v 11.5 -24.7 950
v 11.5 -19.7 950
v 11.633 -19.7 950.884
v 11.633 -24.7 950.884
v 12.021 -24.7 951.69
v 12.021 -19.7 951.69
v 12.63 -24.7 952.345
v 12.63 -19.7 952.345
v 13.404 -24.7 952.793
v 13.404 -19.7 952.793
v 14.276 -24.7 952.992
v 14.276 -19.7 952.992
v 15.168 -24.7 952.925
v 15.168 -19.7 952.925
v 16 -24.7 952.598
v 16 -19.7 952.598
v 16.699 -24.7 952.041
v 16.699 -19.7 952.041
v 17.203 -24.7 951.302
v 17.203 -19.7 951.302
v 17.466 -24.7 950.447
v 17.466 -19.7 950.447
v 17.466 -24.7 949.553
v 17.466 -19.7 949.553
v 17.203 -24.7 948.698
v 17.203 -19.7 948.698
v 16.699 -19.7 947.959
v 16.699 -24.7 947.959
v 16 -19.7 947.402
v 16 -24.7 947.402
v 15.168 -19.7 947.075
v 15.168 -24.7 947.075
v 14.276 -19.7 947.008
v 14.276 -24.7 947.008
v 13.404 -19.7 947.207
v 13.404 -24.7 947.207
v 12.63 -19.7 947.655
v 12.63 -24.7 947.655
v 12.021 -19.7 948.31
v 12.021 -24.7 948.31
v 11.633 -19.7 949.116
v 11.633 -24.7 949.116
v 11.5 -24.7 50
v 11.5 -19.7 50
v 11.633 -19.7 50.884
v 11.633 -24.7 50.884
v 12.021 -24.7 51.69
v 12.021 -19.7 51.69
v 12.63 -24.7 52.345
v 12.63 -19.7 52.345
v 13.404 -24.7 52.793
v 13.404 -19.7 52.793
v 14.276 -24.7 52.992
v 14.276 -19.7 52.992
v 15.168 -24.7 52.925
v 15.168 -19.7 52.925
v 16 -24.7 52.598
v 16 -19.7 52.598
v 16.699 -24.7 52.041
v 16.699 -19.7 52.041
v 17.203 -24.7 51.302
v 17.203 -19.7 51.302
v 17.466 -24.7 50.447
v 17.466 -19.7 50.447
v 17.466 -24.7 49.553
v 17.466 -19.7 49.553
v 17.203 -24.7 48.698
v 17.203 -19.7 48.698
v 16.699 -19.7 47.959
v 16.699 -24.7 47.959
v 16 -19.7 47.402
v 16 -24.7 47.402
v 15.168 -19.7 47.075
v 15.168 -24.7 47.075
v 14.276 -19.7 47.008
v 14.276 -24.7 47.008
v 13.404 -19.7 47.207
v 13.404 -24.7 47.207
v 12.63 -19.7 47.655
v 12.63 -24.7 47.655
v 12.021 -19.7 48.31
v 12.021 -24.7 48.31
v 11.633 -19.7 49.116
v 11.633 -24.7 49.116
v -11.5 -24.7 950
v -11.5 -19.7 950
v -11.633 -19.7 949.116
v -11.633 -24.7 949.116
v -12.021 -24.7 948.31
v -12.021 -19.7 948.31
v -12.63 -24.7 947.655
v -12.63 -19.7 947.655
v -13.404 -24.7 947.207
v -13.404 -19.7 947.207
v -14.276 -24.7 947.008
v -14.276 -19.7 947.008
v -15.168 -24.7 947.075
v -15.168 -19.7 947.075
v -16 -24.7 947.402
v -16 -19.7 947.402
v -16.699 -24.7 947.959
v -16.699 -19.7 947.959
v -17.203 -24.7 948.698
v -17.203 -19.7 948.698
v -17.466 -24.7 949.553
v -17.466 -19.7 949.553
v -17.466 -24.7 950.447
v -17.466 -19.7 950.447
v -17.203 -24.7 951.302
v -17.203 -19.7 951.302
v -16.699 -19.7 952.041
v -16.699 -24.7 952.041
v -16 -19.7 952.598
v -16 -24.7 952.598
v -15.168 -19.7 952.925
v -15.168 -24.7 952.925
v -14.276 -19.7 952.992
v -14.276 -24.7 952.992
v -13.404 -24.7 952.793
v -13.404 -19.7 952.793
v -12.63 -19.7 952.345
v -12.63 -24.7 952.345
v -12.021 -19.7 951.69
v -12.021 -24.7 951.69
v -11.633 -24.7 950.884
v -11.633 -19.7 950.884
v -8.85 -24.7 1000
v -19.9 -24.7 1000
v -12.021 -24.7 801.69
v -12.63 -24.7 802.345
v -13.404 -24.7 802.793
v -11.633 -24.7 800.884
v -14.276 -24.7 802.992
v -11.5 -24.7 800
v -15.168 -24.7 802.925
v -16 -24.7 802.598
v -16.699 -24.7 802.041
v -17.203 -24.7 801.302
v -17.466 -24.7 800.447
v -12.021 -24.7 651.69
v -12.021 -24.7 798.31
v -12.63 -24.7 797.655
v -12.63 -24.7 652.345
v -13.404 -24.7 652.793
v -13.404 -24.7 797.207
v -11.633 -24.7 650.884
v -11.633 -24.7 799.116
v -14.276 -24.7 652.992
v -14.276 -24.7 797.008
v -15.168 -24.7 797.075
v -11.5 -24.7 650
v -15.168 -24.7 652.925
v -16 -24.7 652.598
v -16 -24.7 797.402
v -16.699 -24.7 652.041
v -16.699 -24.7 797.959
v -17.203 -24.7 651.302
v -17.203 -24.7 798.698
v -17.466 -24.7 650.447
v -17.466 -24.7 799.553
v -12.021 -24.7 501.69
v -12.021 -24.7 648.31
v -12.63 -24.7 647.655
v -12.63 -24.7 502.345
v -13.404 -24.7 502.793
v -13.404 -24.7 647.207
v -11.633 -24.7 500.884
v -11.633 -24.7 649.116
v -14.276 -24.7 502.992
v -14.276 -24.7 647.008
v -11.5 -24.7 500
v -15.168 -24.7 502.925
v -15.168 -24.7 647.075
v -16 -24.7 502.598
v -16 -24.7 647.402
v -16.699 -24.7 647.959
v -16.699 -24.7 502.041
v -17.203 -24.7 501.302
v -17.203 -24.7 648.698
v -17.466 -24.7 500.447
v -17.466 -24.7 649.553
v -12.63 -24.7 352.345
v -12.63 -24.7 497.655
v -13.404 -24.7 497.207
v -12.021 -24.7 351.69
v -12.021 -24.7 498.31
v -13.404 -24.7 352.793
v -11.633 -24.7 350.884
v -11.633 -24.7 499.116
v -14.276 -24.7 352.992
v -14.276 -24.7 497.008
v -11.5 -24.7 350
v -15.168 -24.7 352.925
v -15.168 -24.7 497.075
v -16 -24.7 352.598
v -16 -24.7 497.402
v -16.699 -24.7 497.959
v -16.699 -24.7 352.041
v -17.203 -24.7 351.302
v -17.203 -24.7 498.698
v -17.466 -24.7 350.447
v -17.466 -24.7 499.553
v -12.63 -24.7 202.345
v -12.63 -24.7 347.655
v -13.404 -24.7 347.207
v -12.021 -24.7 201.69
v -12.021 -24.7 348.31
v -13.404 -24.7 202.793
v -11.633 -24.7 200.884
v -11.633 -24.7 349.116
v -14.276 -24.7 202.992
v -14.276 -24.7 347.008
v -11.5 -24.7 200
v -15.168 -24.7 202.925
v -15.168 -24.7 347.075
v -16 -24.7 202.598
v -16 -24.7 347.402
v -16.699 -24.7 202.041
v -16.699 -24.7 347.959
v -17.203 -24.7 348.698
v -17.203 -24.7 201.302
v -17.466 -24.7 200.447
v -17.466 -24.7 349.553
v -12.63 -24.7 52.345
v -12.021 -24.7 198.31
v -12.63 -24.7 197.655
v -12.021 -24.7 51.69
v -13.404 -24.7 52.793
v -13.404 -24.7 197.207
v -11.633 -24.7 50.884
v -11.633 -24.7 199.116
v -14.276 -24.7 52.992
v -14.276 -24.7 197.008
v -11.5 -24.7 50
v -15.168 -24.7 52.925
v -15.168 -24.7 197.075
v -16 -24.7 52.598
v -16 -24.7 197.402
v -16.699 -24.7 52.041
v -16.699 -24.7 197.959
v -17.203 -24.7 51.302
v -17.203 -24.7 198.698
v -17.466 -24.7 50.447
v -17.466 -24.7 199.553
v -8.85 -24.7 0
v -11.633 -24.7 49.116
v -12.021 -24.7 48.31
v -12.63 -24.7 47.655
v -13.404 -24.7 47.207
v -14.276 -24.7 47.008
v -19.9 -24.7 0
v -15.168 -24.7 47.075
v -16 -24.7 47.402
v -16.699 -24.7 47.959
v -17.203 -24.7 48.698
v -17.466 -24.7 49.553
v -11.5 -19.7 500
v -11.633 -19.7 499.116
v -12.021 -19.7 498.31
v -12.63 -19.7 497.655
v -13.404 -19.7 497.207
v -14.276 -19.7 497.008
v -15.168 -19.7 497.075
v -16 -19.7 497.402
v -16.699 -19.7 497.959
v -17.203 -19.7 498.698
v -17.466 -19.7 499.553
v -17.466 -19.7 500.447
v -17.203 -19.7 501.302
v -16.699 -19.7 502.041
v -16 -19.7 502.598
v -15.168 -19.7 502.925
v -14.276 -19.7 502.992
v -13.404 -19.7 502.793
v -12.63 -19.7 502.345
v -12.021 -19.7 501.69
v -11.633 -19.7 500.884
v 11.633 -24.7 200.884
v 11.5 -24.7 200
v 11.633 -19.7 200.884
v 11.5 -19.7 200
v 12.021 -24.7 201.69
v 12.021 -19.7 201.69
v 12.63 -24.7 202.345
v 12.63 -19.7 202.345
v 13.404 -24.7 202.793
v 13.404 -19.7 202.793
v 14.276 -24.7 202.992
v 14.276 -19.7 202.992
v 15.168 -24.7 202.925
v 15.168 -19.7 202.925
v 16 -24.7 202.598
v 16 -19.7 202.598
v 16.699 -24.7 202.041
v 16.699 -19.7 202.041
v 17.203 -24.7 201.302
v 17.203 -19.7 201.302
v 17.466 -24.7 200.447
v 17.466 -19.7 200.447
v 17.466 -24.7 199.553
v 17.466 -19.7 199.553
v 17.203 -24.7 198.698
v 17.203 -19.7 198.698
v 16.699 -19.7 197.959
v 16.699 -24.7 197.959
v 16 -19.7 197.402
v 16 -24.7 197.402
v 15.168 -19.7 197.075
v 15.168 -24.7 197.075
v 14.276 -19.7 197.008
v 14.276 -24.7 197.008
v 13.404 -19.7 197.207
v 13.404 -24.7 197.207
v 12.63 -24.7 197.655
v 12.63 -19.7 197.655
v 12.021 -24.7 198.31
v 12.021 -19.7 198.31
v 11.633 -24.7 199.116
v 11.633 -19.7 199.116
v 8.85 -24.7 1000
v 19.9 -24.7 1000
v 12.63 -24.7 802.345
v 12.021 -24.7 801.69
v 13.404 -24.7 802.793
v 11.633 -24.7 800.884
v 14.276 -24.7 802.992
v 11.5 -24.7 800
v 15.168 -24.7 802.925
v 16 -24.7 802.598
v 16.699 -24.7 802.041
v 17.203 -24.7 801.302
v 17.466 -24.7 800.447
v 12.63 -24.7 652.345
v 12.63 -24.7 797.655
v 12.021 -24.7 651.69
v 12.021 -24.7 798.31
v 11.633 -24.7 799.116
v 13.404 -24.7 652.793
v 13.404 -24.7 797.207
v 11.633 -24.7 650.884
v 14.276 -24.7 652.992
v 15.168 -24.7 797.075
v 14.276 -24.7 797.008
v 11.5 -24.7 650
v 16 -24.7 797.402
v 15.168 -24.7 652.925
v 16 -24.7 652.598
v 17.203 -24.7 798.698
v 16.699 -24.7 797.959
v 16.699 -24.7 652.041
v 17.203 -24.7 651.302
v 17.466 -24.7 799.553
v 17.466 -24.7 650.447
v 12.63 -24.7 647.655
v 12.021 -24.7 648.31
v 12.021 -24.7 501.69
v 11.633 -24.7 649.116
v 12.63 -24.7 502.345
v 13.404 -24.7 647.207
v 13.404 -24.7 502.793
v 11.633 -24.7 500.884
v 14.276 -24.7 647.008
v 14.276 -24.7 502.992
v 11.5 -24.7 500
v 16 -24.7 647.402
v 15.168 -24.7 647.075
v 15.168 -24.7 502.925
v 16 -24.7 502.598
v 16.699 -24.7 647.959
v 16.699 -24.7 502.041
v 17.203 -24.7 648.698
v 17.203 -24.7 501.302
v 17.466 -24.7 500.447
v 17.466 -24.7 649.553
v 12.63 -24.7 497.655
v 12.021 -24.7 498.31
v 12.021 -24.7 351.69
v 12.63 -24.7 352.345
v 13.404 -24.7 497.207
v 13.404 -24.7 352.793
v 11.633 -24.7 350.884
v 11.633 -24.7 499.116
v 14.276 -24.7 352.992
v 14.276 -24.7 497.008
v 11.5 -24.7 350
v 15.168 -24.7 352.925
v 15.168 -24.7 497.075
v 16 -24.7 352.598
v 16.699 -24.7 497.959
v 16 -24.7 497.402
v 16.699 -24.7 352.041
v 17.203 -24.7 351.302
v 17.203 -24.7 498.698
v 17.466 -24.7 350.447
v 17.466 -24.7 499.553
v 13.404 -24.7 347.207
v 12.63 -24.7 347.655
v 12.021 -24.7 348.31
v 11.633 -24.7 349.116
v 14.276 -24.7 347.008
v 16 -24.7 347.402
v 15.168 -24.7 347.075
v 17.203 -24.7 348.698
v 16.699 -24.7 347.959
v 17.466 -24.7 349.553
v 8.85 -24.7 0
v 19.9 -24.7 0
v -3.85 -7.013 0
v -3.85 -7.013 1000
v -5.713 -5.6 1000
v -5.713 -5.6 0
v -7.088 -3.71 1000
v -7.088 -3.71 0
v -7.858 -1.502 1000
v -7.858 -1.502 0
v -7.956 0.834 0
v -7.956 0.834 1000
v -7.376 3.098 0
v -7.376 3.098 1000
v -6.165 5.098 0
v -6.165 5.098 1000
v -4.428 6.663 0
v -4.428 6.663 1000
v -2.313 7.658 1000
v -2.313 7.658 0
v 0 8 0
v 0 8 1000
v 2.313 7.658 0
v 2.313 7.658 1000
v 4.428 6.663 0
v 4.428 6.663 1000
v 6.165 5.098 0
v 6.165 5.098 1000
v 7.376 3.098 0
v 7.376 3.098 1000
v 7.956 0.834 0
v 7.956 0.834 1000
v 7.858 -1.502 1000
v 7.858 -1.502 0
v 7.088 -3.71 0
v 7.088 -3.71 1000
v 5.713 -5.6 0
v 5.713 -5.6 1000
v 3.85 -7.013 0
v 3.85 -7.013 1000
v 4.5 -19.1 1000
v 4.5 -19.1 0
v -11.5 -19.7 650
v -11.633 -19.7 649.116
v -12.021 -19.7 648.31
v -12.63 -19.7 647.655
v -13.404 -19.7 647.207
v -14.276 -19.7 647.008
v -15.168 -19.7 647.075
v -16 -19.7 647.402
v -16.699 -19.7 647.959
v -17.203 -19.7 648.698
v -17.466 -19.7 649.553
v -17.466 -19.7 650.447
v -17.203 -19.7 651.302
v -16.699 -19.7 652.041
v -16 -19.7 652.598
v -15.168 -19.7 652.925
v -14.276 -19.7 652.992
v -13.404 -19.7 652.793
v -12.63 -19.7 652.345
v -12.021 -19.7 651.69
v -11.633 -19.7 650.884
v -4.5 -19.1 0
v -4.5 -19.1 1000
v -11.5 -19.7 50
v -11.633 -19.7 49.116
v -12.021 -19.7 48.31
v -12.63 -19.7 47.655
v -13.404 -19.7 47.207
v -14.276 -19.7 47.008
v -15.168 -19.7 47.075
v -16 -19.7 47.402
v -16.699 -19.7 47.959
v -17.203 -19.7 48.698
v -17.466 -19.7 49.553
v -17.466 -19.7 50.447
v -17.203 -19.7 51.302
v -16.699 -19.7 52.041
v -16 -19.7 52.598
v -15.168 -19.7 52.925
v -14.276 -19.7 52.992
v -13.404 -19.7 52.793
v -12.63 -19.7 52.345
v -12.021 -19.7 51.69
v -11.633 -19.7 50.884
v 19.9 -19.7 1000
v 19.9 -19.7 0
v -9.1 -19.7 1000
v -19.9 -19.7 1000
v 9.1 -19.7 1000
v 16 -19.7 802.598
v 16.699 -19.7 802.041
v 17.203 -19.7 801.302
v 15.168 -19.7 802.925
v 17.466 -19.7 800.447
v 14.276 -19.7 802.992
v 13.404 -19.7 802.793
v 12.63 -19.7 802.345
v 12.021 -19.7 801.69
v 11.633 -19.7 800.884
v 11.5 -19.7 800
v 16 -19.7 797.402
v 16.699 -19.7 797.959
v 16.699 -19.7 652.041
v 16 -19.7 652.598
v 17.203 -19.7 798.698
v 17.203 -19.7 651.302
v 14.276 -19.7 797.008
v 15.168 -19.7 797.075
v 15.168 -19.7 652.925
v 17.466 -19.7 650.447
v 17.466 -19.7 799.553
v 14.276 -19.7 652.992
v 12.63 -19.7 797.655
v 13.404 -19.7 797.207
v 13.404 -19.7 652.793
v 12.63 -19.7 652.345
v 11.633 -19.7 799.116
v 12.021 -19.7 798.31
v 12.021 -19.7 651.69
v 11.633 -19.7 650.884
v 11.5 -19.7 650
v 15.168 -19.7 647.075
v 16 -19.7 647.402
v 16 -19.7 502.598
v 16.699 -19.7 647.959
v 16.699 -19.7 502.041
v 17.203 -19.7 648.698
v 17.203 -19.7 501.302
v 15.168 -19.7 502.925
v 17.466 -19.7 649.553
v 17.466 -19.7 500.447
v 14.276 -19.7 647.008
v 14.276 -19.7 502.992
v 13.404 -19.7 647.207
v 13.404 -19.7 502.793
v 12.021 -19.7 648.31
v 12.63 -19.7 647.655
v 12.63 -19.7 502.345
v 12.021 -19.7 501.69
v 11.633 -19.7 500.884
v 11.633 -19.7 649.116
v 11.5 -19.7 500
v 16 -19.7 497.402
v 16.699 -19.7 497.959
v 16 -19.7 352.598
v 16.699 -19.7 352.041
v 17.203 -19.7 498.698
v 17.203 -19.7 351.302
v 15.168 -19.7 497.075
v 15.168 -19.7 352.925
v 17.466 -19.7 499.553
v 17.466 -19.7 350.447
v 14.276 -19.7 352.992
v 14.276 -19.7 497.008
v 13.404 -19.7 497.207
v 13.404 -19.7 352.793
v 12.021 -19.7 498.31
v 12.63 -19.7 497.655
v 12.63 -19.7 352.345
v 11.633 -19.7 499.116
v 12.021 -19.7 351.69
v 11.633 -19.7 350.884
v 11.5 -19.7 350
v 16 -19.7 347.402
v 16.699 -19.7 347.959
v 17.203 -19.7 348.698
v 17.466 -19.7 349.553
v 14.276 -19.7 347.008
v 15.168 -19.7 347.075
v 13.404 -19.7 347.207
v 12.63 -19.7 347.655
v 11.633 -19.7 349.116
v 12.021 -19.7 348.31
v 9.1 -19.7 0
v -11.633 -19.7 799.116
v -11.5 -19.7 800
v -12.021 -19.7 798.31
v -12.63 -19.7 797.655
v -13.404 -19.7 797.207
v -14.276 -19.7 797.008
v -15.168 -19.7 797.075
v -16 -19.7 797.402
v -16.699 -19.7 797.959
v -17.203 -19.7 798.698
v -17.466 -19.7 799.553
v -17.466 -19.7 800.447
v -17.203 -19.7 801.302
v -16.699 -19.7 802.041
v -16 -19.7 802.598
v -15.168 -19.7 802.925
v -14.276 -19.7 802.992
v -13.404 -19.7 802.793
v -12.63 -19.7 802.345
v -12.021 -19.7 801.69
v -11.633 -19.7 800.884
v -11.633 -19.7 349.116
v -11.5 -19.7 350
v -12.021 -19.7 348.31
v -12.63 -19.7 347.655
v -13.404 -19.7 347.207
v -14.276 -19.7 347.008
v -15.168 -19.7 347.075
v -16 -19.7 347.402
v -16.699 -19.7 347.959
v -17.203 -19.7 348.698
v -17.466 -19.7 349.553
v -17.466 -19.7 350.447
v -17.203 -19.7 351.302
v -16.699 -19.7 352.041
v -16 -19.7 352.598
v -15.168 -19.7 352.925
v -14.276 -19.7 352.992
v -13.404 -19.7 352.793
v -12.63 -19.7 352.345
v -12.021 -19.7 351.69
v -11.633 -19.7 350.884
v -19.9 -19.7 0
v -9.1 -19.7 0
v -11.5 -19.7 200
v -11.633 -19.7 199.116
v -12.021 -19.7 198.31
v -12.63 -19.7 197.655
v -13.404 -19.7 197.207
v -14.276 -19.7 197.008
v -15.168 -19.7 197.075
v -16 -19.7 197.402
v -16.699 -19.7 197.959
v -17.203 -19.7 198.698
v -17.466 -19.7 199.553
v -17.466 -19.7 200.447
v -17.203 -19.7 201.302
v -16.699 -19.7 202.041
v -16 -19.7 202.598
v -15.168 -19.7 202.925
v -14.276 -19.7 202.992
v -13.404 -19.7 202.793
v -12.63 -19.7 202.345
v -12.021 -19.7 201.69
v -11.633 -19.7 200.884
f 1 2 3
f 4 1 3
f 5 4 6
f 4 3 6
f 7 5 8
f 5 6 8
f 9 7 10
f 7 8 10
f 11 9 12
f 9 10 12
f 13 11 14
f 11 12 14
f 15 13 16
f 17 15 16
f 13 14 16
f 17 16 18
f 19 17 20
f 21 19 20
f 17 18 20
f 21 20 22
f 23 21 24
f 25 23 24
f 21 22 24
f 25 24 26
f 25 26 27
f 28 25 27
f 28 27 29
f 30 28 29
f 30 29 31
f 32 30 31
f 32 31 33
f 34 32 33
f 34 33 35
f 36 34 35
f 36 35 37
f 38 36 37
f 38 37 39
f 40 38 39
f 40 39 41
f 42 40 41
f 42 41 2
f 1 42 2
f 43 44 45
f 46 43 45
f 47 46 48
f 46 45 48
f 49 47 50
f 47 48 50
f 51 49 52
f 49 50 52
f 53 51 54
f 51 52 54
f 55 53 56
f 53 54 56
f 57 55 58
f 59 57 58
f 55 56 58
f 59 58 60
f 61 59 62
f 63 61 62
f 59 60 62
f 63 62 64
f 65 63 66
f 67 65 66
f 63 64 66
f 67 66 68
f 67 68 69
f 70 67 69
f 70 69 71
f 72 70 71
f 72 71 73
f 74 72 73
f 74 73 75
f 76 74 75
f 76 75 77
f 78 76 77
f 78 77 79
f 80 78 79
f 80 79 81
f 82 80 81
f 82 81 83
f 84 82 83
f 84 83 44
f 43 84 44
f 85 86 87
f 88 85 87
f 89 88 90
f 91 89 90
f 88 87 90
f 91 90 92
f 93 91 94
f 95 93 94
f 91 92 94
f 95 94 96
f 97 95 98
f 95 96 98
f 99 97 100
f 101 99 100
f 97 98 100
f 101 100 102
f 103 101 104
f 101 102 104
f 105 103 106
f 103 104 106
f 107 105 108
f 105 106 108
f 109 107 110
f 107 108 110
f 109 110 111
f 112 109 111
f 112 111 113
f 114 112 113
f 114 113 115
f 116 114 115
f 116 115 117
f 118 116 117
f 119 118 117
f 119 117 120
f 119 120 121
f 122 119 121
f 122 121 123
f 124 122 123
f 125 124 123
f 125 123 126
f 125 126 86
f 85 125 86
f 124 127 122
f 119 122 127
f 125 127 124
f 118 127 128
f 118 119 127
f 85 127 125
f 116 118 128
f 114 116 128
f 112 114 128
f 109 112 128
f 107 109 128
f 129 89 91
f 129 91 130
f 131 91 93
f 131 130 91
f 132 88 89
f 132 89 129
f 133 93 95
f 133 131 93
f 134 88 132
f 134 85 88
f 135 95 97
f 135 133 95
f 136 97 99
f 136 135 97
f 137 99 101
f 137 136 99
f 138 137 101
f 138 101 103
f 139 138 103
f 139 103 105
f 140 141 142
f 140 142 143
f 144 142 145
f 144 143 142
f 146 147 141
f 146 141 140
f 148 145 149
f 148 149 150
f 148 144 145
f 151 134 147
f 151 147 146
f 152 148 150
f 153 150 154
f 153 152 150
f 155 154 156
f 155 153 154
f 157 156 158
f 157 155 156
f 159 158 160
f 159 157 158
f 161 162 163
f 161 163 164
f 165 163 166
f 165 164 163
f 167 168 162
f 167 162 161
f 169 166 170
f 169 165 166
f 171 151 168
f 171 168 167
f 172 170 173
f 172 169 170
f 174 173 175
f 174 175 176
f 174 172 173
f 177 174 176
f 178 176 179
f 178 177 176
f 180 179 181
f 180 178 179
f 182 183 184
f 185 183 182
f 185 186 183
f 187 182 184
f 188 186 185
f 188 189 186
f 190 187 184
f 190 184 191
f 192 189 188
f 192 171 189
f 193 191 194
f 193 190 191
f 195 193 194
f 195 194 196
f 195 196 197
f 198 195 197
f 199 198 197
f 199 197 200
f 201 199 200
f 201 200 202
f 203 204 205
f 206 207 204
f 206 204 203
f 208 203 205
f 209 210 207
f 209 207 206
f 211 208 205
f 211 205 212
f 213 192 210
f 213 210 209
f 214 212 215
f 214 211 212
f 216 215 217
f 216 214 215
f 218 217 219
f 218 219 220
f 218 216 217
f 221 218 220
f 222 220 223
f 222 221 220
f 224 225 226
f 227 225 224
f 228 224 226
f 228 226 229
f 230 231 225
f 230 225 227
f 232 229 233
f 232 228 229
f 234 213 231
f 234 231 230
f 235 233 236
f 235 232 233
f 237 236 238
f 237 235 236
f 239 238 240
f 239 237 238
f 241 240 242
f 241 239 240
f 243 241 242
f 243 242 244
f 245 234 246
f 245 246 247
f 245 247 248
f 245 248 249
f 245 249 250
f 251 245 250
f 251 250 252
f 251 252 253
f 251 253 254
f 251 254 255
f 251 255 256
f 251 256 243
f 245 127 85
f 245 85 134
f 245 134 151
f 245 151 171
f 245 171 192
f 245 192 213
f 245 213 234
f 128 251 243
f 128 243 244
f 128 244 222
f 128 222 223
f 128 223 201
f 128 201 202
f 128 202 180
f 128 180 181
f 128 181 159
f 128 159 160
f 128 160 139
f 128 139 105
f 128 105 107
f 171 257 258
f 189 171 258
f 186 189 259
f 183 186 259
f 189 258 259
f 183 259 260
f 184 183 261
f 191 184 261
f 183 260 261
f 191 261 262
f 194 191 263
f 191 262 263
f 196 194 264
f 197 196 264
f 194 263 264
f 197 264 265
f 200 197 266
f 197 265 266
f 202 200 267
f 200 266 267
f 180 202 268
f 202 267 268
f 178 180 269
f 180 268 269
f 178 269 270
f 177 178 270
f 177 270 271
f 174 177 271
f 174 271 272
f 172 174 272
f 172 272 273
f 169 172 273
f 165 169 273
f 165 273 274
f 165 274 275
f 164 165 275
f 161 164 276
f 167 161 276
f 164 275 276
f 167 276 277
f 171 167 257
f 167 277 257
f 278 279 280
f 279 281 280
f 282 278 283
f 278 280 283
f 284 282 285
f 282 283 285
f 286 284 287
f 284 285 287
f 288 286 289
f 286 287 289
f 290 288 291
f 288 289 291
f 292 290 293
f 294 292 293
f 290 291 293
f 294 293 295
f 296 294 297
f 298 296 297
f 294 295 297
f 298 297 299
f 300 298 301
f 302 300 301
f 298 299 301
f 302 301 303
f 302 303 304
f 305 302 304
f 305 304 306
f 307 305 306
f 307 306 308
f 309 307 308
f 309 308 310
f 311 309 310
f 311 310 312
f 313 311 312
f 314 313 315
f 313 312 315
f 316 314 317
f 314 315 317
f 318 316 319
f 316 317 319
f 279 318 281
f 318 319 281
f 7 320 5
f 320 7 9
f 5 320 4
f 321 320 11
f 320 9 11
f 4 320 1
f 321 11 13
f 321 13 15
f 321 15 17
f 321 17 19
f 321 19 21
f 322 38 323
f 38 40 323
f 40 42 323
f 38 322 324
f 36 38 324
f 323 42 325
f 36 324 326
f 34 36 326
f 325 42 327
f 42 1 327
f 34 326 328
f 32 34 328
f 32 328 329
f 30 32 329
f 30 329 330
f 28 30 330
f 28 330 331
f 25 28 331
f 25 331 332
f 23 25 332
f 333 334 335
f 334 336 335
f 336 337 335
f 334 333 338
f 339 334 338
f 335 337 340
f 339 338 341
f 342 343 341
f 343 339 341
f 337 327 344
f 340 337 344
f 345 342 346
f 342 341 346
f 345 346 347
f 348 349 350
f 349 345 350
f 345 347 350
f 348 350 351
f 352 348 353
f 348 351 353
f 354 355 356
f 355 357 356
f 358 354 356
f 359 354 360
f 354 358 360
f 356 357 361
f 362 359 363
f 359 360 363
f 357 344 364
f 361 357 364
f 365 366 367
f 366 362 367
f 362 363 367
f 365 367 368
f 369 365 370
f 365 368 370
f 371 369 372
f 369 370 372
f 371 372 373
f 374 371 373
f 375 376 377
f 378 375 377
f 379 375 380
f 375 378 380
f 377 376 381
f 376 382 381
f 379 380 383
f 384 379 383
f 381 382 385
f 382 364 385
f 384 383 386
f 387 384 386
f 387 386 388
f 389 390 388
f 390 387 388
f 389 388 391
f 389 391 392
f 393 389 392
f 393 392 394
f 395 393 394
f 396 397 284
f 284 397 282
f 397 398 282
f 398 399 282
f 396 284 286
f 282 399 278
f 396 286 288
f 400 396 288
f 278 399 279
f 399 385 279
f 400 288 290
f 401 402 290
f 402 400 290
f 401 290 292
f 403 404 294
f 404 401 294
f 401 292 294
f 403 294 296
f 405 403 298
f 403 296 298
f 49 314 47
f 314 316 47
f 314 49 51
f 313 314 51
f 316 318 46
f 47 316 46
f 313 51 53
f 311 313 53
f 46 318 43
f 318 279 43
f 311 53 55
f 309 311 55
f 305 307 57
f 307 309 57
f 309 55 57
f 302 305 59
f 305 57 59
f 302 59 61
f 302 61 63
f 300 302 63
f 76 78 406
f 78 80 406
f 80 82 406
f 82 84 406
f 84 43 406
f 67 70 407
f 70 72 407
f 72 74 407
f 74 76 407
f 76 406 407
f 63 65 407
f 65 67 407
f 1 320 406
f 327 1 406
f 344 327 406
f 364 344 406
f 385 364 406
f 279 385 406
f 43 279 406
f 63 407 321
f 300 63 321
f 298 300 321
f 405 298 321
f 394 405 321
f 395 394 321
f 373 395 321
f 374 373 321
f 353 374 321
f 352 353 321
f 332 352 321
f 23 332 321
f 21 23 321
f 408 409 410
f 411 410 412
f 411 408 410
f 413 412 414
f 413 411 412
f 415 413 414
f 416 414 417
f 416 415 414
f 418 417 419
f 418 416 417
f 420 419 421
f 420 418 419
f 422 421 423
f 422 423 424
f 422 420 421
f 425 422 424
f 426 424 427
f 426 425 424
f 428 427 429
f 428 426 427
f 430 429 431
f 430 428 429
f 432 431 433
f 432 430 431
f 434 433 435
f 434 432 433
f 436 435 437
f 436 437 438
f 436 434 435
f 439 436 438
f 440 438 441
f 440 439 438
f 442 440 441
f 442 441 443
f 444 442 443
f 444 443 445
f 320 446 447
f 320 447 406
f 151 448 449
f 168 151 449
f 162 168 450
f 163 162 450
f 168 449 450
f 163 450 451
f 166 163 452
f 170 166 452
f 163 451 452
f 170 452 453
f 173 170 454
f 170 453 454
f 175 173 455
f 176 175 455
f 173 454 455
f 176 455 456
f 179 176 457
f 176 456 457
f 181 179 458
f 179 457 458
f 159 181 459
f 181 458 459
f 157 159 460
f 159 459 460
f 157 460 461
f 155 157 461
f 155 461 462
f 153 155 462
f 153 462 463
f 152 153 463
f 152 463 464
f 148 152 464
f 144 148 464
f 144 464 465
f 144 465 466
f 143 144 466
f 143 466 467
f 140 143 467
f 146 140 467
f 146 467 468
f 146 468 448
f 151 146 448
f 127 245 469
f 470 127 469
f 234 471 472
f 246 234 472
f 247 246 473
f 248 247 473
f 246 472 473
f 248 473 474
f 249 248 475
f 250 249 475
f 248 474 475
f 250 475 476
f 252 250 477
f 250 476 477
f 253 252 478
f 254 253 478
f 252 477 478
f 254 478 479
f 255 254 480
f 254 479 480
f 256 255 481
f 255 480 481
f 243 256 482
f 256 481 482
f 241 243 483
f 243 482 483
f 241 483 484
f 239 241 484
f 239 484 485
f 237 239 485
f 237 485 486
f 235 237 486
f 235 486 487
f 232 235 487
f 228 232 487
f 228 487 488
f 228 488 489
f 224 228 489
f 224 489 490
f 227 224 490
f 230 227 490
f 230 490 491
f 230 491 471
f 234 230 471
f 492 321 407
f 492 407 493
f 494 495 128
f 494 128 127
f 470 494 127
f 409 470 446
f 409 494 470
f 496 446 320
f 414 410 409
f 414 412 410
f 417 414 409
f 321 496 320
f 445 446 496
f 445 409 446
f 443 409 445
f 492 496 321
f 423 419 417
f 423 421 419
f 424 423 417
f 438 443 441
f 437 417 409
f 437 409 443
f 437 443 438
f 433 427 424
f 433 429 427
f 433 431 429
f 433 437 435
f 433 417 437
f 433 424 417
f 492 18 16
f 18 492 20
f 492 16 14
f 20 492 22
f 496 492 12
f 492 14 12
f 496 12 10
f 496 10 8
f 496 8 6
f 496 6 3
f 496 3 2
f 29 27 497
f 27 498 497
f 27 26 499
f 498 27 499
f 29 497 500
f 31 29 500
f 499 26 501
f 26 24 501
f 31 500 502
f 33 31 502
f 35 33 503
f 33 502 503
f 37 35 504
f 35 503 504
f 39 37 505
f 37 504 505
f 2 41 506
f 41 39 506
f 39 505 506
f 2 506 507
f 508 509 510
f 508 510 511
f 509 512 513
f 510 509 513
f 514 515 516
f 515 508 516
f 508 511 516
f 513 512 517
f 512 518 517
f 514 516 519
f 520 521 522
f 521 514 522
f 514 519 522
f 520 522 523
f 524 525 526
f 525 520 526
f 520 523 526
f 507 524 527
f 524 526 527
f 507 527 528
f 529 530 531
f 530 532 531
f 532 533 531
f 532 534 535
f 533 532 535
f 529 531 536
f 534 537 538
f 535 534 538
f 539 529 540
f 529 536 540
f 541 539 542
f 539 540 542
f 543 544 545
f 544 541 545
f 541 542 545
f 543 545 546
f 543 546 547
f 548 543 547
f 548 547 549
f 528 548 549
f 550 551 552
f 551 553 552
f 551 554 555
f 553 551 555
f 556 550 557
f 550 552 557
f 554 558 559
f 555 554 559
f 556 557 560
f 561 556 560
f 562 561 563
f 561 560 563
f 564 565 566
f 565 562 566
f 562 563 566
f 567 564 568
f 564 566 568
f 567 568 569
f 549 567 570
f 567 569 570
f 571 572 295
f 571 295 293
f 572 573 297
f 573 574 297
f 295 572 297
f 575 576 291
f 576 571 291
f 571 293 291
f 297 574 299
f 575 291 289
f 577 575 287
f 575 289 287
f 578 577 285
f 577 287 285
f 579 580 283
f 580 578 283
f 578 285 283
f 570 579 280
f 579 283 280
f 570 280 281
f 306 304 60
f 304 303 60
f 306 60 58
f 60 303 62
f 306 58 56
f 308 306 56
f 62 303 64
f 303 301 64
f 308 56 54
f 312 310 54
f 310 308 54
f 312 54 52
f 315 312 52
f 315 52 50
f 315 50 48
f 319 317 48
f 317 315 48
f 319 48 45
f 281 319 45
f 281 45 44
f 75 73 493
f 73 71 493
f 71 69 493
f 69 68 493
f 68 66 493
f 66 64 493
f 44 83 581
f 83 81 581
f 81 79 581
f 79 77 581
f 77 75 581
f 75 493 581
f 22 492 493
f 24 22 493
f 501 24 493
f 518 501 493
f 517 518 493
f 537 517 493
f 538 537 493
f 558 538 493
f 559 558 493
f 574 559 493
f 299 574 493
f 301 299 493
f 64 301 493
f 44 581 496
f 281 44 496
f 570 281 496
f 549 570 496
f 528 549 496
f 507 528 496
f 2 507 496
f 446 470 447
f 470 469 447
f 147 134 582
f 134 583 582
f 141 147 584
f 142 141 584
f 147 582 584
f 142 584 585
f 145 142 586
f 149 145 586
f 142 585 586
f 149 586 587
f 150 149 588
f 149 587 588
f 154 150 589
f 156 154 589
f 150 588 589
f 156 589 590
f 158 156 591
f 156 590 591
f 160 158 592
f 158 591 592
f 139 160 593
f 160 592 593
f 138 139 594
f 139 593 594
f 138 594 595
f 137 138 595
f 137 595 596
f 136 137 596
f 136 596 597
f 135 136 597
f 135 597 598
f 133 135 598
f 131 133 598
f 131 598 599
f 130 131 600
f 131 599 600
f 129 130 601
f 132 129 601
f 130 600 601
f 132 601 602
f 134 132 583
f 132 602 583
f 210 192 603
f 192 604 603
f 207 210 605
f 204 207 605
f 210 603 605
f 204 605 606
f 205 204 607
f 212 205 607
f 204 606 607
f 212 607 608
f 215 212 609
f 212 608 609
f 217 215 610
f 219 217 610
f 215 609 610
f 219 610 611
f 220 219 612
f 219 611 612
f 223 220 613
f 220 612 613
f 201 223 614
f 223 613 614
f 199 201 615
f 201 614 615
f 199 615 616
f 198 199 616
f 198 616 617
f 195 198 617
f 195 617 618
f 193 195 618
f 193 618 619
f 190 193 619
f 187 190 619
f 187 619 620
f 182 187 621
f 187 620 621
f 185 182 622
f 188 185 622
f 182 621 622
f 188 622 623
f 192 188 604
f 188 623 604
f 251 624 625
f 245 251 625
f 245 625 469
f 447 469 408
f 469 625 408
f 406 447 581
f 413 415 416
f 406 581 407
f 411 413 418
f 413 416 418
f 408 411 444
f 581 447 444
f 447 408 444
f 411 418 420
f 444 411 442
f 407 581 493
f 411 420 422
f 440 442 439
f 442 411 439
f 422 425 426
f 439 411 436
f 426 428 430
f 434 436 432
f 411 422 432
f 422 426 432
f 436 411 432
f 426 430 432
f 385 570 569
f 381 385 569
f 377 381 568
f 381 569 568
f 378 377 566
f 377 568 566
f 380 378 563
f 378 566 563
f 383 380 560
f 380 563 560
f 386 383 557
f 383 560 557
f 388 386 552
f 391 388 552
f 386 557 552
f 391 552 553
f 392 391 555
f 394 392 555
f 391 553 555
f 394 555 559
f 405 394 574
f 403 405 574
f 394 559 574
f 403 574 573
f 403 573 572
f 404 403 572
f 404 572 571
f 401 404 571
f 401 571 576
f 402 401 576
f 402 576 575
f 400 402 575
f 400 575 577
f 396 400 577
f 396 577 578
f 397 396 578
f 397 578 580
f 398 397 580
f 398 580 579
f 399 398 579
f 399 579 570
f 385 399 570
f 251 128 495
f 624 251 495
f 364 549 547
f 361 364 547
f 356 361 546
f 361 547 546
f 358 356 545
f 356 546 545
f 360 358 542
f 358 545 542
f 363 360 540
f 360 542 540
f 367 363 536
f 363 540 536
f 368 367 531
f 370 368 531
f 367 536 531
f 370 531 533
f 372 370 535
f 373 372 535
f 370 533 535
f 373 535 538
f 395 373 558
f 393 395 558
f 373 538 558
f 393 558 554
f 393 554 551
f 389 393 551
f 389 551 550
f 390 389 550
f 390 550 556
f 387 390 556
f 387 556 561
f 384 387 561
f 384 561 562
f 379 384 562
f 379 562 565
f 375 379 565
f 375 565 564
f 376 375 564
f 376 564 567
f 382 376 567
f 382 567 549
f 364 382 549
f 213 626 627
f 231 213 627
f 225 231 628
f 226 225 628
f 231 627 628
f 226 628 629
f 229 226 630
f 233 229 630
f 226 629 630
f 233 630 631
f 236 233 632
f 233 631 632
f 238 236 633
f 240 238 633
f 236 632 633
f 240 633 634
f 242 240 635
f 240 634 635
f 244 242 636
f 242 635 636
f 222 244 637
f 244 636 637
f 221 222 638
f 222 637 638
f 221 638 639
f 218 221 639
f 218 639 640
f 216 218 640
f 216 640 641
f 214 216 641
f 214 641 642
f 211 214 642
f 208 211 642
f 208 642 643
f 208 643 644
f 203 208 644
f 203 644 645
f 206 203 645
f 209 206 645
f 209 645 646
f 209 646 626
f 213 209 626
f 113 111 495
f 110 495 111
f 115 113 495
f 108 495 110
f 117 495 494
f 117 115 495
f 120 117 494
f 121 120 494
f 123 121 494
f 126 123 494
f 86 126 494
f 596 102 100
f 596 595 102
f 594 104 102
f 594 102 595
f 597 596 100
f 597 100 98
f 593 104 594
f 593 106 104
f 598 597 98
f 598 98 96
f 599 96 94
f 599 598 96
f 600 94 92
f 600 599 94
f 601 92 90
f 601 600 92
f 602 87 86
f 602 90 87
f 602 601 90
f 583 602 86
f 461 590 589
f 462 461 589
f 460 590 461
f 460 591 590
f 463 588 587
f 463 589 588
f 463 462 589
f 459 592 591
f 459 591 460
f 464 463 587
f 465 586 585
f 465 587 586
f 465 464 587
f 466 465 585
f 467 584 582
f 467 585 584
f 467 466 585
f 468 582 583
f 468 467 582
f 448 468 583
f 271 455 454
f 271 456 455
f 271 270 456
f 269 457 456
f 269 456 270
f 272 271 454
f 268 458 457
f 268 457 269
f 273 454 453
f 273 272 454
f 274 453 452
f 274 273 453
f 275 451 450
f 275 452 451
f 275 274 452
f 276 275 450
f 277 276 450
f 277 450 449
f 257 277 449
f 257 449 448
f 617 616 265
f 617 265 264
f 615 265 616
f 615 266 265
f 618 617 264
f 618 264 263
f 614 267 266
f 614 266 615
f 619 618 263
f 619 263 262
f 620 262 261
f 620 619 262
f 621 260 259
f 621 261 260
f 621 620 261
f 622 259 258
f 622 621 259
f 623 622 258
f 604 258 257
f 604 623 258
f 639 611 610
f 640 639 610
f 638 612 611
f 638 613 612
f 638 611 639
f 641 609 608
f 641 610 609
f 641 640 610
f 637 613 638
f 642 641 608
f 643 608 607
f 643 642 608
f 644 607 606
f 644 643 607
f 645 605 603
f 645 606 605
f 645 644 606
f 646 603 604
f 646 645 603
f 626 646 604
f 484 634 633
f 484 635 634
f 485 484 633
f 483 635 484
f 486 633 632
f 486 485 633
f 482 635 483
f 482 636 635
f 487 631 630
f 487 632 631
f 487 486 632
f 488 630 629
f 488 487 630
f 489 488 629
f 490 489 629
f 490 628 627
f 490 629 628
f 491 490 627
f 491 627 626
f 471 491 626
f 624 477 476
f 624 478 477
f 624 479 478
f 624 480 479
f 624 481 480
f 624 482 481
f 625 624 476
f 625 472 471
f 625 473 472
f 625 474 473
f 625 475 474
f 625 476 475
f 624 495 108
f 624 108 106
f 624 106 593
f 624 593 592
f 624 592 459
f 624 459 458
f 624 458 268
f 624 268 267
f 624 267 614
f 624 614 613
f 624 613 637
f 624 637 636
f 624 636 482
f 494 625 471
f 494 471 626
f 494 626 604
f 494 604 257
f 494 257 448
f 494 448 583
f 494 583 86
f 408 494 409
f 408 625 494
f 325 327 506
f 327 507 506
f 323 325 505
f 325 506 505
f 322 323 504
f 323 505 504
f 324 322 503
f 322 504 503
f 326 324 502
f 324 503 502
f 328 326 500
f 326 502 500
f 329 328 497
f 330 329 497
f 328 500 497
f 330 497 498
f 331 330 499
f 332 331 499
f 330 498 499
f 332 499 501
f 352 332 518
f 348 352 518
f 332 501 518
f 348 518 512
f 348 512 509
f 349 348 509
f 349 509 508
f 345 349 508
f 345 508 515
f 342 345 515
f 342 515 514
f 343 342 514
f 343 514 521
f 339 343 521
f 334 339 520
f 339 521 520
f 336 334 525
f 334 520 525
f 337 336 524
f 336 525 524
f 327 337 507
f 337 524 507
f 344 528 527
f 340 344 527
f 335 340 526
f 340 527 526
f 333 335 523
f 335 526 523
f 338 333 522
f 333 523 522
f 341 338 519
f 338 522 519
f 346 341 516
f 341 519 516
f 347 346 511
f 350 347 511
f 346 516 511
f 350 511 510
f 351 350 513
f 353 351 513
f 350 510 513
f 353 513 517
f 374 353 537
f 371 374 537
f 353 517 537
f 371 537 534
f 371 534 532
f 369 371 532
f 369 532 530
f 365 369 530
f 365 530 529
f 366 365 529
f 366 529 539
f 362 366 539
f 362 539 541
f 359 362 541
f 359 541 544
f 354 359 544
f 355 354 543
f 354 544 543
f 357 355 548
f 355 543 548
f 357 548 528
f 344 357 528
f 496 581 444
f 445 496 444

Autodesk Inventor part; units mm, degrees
ref_plane "YZ Plane" through (0, 0, 0) normal (1, 0, 0) x (0, 1, 0)
ref_plane "XZ Plane" through (0, 0, 0) normal (0, 1, 0) x (-1, 0, 0)
ref_plane "XY Plane" through (0, 0, 0) normal (0, 0, 1) x (1, 0, 0)
sketch "Sketch1" plane through (0, 0, 0) normal (0, 0, 1) x (1, 0, 0)
  circle A0 centre (0, 0) radius 8
  line L0 (0, 0) -> (0, -24.7) construction
  line L1 (0, -24.7) -> (-19.9, -24.7)
  line L2 (-19.9, -24.7) -> (-19.9, -19.7)
  line L3 (-19.9, -19.7) -> (-9.1, -19.7)
  line L4 (-9.1, -19.7) -> (-3.85, -7.0127)
  line L5 (0, -24.7) -> (19.9, -24.7)
  line L6 (19.9, -24.7) -> (19.9, -19.7)
  line L7 (19.9, -19.7) -> (9.1, -19.7)
  line L8 (9.1, -19.7) -> (3.85, -7.0127)
  line L9 (0, 0) -> (0, 8) construction
  line L10 (-3.85, -7.0127) -> (3.85, -7.0127) construction
  line L11 (-8.85, -24.7) -> (-4.5, -19.1)
  line L12 (-4.5, -19.1) -> (0, -19.1)
  line L13 (0, -19.1) -> (4.5, -19.1)
  line L14 (4.5, -19.1) -> (8.85, -24.7)
  dimension "d0" = 16
  dimension "d1" = 39.8
  dimension "d2" = 5
  dimension "d4" = 10.8
  dimension "d7" = 32.7
  dimension "d8" = 7.7
  dimension "d9" = 9
  dimension "d10" = 5.6
  dimension "d11" = 17.7
extrude "Extrusion1" add sketch "Sketch1" along normal blind 1000 contours A0 | A0 L8 L7 L6 L5 L14 L13 L12 L11 L1 L2 L3 L4
sketch "Sketch2" plane through (-19.9, -19.7, 1000) normal (0, 1, 0) x (1, 0, 0)
  circle A0 centre (5.4, 950) radius 3
  line L0 (10.8, 1000) -> (0, 1000) projected
  line L1 (5.4, 1000) -> (5.4, 950) construction
  line L2 (0, 1000) -> (11.05, 1000) construction
  point P0 (19.9, 1000)
  dimension "d14" = 50
  dimension "d15" = 6
extrude "Extrusion2" cut sketch "Sketch2" against normal through all
pattern_linear "Rectangular Pattern1" count 7 spacing 150 along (0, 0, 1) of "Extrusion2"
mirror "Mirror1" about plane through (0, 0, 0) normal (1, 0, 0) of "Rectangular Pattern1", "Extrusion2"
properties part number "Linear Rail"
